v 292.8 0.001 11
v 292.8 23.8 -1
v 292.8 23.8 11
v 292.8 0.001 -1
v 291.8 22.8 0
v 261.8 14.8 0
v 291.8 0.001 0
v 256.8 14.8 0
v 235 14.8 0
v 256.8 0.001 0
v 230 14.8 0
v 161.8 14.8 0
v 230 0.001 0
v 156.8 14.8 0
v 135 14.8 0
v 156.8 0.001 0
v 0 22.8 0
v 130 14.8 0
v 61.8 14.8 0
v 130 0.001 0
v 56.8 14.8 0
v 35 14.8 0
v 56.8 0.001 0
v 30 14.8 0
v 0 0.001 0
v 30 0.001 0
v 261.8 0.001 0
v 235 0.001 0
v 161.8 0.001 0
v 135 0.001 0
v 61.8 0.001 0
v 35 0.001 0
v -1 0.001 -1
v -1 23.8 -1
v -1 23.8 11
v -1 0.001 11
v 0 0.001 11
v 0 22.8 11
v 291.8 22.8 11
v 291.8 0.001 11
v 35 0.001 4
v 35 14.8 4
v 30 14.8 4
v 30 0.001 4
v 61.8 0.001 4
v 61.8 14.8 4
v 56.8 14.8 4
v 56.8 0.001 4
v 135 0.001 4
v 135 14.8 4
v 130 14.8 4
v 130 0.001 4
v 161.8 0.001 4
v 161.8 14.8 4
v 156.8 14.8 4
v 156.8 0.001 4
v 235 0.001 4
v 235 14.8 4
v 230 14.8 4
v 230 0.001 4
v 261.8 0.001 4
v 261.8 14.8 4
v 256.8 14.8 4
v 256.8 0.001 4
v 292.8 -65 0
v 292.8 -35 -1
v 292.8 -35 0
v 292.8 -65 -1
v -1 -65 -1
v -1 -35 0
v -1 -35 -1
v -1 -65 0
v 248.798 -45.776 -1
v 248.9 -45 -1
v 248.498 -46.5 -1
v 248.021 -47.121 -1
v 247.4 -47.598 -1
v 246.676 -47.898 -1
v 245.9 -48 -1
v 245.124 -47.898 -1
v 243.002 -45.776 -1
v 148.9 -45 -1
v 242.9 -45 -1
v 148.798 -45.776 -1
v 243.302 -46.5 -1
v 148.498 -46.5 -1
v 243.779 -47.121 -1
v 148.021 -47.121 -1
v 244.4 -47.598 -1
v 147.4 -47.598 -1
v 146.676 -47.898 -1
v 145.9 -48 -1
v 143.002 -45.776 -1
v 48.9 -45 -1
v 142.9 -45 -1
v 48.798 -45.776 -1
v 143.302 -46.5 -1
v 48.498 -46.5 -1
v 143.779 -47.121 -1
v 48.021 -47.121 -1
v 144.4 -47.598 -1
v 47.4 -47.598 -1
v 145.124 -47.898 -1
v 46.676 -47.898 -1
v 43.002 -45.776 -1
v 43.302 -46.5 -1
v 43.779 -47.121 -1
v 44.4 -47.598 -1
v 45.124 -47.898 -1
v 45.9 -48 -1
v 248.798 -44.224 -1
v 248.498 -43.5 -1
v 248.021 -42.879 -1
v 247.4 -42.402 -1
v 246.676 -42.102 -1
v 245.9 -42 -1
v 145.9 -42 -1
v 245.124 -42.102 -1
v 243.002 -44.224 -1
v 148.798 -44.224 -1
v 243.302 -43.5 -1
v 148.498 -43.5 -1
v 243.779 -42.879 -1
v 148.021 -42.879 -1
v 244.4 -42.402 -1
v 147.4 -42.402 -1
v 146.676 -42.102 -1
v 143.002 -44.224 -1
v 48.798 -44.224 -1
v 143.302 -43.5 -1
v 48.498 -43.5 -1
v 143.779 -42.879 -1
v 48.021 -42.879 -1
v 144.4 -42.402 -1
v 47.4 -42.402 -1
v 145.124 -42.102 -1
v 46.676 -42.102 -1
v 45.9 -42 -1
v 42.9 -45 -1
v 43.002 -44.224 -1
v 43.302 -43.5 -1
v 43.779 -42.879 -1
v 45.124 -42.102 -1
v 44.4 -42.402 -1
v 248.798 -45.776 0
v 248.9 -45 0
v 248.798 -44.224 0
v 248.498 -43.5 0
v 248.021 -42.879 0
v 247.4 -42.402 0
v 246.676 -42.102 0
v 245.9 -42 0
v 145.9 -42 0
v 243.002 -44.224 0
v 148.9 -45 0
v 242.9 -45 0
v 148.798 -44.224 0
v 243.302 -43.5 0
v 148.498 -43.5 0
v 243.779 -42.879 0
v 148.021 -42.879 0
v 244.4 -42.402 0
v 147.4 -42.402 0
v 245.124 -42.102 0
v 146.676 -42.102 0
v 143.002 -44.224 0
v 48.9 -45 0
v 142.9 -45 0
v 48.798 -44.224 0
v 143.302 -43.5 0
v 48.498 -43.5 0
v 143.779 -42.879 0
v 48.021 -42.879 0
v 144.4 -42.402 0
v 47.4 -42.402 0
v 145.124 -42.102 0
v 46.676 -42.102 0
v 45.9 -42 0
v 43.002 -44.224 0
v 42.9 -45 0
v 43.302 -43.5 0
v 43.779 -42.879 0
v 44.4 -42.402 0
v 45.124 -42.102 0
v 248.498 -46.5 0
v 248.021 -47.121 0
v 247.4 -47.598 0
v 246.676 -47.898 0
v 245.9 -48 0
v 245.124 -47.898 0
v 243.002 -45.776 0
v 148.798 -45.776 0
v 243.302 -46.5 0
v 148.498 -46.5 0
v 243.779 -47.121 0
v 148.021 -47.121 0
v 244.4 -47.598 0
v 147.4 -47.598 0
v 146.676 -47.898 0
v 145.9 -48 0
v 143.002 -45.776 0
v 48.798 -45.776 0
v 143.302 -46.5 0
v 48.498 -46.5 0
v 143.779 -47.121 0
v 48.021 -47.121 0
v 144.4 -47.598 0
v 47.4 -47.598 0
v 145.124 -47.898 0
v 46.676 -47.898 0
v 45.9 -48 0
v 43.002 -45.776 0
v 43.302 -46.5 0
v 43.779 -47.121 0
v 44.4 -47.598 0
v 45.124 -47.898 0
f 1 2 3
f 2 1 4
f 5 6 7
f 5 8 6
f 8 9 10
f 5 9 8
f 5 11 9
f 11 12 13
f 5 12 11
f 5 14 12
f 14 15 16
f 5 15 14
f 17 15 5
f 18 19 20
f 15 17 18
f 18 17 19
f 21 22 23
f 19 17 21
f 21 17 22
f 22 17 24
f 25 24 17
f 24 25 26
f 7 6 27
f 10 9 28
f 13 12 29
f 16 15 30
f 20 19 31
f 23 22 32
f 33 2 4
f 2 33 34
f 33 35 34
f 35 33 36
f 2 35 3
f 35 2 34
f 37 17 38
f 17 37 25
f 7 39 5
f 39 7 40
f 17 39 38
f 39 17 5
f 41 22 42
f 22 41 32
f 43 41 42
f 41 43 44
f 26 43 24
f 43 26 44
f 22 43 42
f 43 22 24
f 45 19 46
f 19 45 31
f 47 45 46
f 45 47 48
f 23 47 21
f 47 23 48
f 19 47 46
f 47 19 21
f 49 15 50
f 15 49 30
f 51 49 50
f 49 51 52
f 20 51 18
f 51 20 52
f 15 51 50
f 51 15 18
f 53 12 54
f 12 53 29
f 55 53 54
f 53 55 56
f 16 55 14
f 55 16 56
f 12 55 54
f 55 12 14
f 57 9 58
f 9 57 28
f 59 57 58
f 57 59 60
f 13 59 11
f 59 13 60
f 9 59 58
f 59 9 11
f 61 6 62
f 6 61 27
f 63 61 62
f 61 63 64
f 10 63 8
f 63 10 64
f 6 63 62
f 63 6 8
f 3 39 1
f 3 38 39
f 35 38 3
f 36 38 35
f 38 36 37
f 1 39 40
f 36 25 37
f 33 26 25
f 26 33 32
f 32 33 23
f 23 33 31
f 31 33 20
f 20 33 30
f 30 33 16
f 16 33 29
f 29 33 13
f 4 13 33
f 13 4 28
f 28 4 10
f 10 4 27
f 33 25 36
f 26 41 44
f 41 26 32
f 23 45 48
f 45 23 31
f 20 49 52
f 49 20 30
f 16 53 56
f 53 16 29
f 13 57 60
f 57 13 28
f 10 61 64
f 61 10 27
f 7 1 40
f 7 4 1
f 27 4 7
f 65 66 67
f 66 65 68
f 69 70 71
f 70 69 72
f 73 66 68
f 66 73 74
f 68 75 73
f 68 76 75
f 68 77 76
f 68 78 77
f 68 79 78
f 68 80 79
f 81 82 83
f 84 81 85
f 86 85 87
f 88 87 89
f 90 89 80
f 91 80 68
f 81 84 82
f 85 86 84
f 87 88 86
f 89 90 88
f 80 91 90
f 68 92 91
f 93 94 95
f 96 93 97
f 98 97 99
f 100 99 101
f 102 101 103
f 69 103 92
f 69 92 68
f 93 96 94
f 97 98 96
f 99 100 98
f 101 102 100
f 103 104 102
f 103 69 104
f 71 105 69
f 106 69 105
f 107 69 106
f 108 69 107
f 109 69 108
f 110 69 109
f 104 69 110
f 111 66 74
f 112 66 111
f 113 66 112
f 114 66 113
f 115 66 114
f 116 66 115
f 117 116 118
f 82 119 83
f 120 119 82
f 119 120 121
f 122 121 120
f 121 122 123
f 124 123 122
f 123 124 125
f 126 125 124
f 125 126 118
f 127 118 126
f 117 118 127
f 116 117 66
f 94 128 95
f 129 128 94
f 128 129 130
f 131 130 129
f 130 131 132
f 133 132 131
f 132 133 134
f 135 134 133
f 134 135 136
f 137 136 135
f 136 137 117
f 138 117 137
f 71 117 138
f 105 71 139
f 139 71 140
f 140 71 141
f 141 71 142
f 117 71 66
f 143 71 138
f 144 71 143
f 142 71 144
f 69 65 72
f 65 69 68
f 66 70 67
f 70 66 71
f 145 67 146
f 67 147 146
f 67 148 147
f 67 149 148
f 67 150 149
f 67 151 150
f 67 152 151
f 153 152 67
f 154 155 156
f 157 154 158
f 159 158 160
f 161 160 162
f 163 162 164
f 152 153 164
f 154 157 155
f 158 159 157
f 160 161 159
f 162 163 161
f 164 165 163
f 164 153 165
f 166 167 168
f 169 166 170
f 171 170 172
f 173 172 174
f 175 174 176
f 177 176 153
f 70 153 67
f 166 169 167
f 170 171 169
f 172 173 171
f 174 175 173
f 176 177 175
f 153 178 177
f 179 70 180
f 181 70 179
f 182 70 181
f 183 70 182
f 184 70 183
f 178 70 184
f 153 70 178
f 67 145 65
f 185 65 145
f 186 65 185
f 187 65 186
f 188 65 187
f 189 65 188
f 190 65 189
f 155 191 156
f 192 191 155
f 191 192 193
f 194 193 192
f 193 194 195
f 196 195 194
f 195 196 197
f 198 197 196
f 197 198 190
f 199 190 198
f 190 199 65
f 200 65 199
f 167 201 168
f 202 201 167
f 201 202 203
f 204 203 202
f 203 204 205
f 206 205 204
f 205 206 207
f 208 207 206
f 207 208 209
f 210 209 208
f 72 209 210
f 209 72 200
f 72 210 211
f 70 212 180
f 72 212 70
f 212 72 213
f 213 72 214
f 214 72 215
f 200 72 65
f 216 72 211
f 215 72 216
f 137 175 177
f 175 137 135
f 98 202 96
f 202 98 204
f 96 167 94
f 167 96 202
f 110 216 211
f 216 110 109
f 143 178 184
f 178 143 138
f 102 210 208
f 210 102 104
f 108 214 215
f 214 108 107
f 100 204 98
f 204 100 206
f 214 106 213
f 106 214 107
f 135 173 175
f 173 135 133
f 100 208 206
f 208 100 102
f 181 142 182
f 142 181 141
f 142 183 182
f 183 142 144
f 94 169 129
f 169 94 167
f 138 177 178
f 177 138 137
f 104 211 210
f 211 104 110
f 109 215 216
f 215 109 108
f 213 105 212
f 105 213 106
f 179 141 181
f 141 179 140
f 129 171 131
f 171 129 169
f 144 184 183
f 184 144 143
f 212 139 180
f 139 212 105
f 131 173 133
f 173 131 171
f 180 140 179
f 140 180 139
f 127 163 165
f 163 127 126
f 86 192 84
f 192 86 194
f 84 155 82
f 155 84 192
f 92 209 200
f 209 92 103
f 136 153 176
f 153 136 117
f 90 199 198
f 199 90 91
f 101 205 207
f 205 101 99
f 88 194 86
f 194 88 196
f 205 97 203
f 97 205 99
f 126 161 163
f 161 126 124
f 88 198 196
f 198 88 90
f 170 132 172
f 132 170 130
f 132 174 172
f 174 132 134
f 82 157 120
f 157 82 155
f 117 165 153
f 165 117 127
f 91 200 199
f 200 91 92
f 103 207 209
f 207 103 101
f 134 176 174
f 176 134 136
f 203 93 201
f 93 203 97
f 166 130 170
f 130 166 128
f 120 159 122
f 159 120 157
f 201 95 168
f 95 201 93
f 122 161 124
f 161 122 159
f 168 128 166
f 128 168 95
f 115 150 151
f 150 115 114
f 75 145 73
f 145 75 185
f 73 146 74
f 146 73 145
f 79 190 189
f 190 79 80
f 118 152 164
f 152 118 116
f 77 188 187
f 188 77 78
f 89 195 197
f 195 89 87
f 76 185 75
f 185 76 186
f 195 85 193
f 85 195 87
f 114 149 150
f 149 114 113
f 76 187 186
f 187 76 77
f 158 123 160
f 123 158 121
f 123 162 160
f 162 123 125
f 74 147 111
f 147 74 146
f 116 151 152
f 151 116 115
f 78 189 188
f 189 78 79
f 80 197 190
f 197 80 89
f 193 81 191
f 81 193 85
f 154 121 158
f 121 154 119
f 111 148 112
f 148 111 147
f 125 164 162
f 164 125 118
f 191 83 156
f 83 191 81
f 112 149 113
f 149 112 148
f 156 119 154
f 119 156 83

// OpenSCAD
unit_x = 21.8;
unit_y = 22.8;
n = 3;

unit_pitch = 100;
wire_slot = 8;
block_w = 5;
side_slot_ext = 30;

shell_thickness = 1;
shell_front_height = 30;
shell_front_drop = 6;
shell_back_height = 12;
block_height = 4;

punch_r = 3;
punch_y = 4;

full_x = (side_slot_ext + block_w) * 2 + unit_pitch * (n - 1) + unit_x;
full_y = unit_y;

module shell() union() {
  t = shell_thickness;
  // Bottom
  translate([-t, -t, -t])
    cube([full_x + t * 2, full_y + t * 2, t]);
  // Left, right
  translate([-t, -t, 0])
    cube([t, full_y + t * 2, shell_back_height]);
  translate([full_x, -t, 0])
    cube([t, full_y + t * 2, shell_back_height]);
  // Back
  translate([-t, full_y, 0])
    cube([full_x + t * 2, t, shell_back_height]);
  // Front
  translate([-t, -t, -shell_front_drop])
    cube([full_x + t * 2, t, shell_front_height]);
}

unit0_x = side_slot_ext + block_w;

module shell_punched() difference() {
  shell();
  for (i = [0:n - 1]) {
    translate([unit0_x + unit_x / 2 + unit_pitch * i, 0, punch_y])
    rotate(90, [1, 0, 0])
      cylinder(shell_thickness, punch_r, punch_r, $fn = 24);
  }
}

module full_model() union() {
  shell_punched();
  for (i = [0:n - 1]) {
    translate([unit0_x - block_w + unit_pitch * i, 0, 0])
      cube([block_w, full_y - wire_slot, block_height]);
    translate([unit0_x + unit_x + unit_pitch * i, 0, 0])
      cube([block_w, full_y - wire_slot, block_height]);
  }
}

intersection() {
  full_model();
  translate([-shell_thickness, 0.001, -shell_thickness])
    cube([full_x + shell_thickness * 2, full_y + shell_thickness, shell_back_height]);
}

translate([0, -5 - shell_front_height - shell_front_drop, 0])
  rotate(90, [1, 0, 0])
    intersection() {
      full_model();
      translate([-shell_thickness, -shell_thickness, -shell_front_drop])
        cube([full_x + shell_thickness * 2, shell_thickness, shell_front_height]);
    }
